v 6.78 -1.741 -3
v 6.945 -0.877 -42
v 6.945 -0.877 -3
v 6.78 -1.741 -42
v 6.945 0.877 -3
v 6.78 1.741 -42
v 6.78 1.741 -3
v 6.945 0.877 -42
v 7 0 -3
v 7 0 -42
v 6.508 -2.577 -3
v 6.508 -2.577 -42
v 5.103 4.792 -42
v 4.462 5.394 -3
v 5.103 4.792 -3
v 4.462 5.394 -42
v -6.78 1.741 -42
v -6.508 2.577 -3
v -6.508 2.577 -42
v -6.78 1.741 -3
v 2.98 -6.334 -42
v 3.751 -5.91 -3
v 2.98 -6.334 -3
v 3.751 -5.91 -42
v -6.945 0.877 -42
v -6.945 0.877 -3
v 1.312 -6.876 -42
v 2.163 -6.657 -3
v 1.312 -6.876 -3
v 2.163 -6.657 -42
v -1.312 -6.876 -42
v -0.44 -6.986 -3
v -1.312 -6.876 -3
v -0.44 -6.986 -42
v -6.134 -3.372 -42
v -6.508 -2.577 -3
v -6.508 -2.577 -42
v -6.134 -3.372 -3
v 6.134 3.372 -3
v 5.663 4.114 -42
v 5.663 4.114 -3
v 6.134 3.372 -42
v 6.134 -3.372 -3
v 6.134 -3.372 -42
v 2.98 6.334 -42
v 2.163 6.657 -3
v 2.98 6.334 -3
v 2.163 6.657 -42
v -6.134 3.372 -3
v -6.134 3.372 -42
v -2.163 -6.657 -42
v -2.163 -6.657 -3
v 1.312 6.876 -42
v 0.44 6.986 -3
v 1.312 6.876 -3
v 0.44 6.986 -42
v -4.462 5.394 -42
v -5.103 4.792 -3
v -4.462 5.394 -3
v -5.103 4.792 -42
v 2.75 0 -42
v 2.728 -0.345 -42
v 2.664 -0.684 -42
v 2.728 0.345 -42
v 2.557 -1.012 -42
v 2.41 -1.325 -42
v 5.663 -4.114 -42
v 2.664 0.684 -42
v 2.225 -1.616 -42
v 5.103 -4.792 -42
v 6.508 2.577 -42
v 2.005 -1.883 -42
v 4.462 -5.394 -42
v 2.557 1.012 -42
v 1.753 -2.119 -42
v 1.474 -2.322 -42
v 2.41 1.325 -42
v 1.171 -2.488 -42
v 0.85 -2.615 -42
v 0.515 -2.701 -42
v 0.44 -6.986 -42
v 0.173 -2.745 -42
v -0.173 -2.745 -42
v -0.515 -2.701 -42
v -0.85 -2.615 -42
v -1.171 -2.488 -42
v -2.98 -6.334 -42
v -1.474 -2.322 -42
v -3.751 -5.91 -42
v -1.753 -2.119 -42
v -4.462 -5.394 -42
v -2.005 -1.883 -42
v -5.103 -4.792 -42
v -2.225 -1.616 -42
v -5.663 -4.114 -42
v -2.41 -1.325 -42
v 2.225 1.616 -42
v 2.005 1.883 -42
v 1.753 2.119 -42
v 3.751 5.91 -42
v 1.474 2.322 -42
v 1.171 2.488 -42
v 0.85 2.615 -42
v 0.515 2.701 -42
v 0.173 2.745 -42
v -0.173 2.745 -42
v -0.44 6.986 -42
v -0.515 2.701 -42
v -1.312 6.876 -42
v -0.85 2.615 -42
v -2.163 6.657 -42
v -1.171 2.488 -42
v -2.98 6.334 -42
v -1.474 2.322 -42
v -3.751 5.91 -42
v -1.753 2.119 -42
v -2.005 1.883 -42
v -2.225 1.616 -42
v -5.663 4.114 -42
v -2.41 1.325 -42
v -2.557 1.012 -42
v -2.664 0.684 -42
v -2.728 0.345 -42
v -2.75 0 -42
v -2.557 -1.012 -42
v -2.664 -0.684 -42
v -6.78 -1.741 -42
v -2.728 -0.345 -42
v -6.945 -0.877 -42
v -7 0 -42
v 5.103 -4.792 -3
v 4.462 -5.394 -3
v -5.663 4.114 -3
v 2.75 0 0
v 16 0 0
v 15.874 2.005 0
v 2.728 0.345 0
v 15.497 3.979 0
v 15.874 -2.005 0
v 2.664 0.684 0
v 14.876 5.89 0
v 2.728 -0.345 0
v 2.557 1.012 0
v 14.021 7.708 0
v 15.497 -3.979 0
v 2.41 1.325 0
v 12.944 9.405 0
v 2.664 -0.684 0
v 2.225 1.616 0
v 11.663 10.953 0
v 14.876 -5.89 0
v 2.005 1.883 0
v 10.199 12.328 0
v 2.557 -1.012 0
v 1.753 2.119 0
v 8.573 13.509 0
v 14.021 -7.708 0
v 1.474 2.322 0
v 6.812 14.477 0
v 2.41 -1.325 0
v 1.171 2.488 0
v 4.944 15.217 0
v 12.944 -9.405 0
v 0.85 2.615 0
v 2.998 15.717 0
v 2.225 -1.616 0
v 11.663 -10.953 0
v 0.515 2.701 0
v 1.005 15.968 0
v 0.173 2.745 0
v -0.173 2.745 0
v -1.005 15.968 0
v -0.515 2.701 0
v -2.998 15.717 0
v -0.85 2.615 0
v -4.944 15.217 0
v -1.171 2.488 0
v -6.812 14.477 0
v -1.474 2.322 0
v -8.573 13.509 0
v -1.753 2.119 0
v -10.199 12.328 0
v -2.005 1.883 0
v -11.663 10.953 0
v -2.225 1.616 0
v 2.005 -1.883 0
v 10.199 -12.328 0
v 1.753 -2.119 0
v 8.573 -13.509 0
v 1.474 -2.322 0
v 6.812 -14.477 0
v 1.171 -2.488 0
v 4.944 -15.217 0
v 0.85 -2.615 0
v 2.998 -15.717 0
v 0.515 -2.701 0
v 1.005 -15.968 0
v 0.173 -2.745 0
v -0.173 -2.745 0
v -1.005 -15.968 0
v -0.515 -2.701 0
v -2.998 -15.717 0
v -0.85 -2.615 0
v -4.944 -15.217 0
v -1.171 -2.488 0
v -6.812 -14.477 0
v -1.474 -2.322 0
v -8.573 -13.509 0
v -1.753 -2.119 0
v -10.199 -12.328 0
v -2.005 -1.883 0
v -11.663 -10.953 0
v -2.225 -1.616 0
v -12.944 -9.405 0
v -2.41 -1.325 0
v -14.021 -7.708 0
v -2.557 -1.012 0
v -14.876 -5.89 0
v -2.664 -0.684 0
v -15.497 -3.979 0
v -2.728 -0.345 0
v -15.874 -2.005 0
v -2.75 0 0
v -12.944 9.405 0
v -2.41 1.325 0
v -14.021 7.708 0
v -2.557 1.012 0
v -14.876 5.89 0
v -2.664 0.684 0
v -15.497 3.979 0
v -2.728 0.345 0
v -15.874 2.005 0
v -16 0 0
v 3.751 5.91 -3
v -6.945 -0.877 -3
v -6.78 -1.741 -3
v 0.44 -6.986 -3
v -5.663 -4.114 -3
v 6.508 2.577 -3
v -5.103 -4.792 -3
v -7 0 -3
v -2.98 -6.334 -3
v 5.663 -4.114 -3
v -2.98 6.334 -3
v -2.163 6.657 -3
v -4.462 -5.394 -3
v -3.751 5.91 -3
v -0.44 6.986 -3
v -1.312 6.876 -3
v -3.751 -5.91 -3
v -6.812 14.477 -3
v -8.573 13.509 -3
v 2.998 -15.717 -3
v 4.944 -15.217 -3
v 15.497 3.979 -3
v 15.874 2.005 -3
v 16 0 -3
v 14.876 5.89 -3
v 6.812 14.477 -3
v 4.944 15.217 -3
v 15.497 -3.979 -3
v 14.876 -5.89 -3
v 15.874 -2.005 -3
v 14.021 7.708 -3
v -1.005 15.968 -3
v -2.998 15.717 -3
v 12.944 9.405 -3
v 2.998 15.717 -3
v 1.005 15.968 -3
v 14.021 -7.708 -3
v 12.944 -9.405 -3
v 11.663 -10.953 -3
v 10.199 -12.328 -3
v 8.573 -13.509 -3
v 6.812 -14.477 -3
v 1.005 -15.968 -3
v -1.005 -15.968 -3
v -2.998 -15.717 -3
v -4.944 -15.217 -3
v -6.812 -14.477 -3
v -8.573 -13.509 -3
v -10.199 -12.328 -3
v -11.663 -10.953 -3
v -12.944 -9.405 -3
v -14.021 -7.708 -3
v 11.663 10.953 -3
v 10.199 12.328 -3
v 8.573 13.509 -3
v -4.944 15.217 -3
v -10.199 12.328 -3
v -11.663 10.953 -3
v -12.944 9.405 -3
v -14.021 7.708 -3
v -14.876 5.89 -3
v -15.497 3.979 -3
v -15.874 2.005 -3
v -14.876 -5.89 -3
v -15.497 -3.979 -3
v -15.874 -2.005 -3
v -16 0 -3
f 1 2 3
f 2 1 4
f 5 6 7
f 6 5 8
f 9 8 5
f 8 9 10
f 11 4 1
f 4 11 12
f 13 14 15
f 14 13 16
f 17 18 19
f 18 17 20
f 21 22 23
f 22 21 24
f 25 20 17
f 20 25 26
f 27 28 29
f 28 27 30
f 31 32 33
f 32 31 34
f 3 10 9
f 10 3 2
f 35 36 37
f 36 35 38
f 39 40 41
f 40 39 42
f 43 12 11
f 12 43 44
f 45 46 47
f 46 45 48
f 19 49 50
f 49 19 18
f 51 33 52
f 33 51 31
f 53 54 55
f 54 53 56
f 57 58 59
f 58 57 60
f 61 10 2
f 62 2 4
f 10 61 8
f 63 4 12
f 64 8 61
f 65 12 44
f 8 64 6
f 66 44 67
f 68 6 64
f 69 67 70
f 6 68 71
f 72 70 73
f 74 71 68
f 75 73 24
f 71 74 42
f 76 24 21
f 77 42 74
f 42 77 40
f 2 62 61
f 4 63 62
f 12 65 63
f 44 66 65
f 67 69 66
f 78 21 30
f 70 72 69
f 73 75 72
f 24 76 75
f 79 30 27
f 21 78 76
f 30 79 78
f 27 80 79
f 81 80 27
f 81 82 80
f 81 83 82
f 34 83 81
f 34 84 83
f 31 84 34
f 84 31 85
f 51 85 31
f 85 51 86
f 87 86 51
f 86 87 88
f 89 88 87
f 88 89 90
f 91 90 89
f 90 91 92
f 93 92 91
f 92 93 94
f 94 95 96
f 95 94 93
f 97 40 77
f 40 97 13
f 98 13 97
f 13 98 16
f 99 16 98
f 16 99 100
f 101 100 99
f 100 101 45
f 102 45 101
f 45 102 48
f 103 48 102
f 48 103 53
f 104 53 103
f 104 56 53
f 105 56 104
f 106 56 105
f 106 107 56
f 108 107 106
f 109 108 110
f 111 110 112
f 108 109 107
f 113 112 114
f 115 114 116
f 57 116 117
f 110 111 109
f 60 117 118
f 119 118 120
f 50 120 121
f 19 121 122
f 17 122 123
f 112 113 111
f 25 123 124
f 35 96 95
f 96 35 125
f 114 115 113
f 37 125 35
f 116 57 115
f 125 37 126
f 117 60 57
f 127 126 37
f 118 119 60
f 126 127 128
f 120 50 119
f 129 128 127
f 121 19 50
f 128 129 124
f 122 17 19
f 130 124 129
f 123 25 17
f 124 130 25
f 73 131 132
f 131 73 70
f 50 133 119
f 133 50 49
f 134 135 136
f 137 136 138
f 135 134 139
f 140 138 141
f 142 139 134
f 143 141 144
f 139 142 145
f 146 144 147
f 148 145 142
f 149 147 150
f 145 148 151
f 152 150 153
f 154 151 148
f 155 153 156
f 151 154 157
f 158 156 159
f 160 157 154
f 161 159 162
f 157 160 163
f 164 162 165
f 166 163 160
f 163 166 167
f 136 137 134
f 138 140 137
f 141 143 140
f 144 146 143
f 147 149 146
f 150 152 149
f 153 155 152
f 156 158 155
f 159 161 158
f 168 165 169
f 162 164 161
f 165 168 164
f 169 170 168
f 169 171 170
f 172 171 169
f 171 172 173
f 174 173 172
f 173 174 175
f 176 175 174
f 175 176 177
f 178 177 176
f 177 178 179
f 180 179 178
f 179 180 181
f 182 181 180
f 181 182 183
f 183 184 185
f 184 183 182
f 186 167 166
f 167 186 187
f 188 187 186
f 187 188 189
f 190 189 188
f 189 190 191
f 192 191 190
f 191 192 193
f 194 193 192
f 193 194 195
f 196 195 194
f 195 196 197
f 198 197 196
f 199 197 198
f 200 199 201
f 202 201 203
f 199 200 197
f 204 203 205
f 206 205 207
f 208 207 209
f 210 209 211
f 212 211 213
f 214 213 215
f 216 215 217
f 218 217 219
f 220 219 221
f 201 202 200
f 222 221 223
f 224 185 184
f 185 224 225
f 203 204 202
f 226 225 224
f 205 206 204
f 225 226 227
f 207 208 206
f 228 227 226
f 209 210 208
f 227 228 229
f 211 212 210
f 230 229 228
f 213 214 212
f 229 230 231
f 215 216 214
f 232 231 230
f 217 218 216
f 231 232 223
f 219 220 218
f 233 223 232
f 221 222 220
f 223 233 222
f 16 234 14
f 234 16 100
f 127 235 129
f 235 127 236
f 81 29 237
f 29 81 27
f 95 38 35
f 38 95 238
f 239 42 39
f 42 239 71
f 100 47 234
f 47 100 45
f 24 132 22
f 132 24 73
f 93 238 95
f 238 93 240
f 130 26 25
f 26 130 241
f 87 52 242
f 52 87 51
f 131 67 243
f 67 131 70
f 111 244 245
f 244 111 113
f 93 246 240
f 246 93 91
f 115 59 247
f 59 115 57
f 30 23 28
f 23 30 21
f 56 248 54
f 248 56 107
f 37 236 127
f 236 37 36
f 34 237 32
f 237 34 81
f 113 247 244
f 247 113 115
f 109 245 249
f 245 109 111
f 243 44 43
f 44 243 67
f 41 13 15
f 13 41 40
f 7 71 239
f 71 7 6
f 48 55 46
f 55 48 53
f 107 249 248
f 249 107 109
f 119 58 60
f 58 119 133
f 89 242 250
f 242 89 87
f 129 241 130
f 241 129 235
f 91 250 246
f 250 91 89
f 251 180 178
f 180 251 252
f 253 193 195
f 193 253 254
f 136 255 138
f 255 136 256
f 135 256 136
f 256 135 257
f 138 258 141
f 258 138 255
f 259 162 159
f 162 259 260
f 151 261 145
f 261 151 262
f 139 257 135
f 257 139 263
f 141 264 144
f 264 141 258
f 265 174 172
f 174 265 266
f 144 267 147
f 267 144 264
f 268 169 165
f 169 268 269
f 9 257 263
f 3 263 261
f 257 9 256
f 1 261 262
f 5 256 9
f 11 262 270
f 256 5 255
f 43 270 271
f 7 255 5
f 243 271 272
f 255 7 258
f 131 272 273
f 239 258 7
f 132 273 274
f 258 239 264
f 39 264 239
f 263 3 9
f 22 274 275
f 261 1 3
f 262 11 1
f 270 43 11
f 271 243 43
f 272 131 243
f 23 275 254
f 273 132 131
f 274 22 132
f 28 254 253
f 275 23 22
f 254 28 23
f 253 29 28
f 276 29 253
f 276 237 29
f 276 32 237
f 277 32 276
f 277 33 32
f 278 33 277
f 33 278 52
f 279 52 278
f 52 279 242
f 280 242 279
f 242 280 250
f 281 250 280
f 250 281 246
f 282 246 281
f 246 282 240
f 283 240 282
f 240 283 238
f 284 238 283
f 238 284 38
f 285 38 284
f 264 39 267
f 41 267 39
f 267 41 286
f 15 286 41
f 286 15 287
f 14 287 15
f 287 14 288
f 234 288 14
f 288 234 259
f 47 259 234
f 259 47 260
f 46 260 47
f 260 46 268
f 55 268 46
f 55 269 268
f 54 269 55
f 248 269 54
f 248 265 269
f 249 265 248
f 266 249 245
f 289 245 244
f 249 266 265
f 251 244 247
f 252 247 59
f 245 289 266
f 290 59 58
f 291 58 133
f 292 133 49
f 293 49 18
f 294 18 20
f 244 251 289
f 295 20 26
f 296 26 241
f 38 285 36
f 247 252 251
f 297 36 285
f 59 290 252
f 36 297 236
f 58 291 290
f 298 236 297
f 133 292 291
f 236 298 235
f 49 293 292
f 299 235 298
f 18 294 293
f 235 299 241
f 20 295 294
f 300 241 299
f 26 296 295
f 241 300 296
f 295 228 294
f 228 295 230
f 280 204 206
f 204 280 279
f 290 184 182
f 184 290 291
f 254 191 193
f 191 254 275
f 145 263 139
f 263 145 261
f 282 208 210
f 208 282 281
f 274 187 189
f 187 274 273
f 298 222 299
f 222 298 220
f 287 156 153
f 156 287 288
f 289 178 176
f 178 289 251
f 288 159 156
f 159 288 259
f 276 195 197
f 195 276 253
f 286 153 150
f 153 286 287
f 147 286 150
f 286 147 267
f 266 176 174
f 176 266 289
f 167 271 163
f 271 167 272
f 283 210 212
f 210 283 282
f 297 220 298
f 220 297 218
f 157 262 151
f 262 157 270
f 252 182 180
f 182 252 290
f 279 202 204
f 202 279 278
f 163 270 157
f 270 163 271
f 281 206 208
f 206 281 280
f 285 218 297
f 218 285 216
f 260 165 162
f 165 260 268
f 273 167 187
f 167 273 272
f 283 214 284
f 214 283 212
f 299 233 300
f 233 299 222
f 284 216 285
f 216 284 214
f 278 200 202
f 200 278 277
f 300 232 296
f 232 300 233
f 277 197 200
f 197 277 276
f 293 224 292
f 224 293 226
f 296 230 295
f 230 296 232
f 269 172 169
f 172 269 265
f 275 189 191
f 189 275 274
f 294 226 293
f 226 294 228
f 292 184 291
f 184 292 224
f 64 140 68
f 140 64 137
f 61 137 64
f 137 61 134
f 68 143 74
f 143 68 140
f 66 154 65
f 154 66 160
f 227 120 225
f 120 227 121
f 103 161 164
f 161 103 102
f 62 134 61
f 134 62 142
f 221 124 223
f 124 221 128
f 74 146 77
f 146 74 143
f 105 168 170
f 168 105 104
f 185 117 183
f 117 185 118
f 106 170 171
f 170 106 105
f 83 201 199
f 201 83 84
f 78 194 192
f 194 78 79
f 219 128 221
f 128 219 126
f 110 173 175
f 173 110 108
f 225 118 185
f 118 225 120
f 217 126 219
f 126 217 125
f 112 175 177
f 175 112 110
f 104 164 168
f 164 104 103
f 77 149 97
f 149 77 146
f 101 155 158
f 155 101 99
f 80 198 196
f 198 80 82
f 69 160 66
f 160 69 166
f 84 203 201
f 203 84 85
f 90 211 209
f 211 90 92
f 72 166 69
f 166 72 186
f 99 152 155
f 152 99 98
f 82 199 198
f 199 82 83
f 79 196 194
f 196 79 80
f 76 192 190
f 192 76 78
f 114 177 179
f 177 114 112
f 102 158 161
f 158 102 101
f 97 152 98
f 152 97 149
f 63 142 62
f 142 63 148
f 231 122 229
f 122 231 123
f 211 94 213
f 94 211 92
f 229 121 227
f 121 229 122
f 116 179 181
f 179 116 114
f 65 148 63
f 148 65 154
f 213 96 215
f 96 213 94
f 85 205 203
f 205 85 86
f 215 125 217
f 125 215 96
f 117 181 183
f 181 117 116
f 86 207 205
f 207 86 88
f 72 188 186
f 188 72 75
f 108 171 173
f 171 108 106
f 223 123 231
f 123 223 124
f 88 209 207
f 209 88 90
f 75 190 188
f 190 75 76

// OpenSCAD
$fn = 50;


difference() {
	union() {
		translate(v = [0, 0, -42.0000000000]) {
			cylinder(h = 42, r = 7.0000000000);
		}
		translate(v = [0, 0, -3.0000000000]) {
			cylinder(h = 3, r = 16.0000000000);
		}
	}
	union() {
		#translate(v = [0, 0, -42]) {
			cylinder(h = 42, r = 2.7500000000);
		}
	}
}
